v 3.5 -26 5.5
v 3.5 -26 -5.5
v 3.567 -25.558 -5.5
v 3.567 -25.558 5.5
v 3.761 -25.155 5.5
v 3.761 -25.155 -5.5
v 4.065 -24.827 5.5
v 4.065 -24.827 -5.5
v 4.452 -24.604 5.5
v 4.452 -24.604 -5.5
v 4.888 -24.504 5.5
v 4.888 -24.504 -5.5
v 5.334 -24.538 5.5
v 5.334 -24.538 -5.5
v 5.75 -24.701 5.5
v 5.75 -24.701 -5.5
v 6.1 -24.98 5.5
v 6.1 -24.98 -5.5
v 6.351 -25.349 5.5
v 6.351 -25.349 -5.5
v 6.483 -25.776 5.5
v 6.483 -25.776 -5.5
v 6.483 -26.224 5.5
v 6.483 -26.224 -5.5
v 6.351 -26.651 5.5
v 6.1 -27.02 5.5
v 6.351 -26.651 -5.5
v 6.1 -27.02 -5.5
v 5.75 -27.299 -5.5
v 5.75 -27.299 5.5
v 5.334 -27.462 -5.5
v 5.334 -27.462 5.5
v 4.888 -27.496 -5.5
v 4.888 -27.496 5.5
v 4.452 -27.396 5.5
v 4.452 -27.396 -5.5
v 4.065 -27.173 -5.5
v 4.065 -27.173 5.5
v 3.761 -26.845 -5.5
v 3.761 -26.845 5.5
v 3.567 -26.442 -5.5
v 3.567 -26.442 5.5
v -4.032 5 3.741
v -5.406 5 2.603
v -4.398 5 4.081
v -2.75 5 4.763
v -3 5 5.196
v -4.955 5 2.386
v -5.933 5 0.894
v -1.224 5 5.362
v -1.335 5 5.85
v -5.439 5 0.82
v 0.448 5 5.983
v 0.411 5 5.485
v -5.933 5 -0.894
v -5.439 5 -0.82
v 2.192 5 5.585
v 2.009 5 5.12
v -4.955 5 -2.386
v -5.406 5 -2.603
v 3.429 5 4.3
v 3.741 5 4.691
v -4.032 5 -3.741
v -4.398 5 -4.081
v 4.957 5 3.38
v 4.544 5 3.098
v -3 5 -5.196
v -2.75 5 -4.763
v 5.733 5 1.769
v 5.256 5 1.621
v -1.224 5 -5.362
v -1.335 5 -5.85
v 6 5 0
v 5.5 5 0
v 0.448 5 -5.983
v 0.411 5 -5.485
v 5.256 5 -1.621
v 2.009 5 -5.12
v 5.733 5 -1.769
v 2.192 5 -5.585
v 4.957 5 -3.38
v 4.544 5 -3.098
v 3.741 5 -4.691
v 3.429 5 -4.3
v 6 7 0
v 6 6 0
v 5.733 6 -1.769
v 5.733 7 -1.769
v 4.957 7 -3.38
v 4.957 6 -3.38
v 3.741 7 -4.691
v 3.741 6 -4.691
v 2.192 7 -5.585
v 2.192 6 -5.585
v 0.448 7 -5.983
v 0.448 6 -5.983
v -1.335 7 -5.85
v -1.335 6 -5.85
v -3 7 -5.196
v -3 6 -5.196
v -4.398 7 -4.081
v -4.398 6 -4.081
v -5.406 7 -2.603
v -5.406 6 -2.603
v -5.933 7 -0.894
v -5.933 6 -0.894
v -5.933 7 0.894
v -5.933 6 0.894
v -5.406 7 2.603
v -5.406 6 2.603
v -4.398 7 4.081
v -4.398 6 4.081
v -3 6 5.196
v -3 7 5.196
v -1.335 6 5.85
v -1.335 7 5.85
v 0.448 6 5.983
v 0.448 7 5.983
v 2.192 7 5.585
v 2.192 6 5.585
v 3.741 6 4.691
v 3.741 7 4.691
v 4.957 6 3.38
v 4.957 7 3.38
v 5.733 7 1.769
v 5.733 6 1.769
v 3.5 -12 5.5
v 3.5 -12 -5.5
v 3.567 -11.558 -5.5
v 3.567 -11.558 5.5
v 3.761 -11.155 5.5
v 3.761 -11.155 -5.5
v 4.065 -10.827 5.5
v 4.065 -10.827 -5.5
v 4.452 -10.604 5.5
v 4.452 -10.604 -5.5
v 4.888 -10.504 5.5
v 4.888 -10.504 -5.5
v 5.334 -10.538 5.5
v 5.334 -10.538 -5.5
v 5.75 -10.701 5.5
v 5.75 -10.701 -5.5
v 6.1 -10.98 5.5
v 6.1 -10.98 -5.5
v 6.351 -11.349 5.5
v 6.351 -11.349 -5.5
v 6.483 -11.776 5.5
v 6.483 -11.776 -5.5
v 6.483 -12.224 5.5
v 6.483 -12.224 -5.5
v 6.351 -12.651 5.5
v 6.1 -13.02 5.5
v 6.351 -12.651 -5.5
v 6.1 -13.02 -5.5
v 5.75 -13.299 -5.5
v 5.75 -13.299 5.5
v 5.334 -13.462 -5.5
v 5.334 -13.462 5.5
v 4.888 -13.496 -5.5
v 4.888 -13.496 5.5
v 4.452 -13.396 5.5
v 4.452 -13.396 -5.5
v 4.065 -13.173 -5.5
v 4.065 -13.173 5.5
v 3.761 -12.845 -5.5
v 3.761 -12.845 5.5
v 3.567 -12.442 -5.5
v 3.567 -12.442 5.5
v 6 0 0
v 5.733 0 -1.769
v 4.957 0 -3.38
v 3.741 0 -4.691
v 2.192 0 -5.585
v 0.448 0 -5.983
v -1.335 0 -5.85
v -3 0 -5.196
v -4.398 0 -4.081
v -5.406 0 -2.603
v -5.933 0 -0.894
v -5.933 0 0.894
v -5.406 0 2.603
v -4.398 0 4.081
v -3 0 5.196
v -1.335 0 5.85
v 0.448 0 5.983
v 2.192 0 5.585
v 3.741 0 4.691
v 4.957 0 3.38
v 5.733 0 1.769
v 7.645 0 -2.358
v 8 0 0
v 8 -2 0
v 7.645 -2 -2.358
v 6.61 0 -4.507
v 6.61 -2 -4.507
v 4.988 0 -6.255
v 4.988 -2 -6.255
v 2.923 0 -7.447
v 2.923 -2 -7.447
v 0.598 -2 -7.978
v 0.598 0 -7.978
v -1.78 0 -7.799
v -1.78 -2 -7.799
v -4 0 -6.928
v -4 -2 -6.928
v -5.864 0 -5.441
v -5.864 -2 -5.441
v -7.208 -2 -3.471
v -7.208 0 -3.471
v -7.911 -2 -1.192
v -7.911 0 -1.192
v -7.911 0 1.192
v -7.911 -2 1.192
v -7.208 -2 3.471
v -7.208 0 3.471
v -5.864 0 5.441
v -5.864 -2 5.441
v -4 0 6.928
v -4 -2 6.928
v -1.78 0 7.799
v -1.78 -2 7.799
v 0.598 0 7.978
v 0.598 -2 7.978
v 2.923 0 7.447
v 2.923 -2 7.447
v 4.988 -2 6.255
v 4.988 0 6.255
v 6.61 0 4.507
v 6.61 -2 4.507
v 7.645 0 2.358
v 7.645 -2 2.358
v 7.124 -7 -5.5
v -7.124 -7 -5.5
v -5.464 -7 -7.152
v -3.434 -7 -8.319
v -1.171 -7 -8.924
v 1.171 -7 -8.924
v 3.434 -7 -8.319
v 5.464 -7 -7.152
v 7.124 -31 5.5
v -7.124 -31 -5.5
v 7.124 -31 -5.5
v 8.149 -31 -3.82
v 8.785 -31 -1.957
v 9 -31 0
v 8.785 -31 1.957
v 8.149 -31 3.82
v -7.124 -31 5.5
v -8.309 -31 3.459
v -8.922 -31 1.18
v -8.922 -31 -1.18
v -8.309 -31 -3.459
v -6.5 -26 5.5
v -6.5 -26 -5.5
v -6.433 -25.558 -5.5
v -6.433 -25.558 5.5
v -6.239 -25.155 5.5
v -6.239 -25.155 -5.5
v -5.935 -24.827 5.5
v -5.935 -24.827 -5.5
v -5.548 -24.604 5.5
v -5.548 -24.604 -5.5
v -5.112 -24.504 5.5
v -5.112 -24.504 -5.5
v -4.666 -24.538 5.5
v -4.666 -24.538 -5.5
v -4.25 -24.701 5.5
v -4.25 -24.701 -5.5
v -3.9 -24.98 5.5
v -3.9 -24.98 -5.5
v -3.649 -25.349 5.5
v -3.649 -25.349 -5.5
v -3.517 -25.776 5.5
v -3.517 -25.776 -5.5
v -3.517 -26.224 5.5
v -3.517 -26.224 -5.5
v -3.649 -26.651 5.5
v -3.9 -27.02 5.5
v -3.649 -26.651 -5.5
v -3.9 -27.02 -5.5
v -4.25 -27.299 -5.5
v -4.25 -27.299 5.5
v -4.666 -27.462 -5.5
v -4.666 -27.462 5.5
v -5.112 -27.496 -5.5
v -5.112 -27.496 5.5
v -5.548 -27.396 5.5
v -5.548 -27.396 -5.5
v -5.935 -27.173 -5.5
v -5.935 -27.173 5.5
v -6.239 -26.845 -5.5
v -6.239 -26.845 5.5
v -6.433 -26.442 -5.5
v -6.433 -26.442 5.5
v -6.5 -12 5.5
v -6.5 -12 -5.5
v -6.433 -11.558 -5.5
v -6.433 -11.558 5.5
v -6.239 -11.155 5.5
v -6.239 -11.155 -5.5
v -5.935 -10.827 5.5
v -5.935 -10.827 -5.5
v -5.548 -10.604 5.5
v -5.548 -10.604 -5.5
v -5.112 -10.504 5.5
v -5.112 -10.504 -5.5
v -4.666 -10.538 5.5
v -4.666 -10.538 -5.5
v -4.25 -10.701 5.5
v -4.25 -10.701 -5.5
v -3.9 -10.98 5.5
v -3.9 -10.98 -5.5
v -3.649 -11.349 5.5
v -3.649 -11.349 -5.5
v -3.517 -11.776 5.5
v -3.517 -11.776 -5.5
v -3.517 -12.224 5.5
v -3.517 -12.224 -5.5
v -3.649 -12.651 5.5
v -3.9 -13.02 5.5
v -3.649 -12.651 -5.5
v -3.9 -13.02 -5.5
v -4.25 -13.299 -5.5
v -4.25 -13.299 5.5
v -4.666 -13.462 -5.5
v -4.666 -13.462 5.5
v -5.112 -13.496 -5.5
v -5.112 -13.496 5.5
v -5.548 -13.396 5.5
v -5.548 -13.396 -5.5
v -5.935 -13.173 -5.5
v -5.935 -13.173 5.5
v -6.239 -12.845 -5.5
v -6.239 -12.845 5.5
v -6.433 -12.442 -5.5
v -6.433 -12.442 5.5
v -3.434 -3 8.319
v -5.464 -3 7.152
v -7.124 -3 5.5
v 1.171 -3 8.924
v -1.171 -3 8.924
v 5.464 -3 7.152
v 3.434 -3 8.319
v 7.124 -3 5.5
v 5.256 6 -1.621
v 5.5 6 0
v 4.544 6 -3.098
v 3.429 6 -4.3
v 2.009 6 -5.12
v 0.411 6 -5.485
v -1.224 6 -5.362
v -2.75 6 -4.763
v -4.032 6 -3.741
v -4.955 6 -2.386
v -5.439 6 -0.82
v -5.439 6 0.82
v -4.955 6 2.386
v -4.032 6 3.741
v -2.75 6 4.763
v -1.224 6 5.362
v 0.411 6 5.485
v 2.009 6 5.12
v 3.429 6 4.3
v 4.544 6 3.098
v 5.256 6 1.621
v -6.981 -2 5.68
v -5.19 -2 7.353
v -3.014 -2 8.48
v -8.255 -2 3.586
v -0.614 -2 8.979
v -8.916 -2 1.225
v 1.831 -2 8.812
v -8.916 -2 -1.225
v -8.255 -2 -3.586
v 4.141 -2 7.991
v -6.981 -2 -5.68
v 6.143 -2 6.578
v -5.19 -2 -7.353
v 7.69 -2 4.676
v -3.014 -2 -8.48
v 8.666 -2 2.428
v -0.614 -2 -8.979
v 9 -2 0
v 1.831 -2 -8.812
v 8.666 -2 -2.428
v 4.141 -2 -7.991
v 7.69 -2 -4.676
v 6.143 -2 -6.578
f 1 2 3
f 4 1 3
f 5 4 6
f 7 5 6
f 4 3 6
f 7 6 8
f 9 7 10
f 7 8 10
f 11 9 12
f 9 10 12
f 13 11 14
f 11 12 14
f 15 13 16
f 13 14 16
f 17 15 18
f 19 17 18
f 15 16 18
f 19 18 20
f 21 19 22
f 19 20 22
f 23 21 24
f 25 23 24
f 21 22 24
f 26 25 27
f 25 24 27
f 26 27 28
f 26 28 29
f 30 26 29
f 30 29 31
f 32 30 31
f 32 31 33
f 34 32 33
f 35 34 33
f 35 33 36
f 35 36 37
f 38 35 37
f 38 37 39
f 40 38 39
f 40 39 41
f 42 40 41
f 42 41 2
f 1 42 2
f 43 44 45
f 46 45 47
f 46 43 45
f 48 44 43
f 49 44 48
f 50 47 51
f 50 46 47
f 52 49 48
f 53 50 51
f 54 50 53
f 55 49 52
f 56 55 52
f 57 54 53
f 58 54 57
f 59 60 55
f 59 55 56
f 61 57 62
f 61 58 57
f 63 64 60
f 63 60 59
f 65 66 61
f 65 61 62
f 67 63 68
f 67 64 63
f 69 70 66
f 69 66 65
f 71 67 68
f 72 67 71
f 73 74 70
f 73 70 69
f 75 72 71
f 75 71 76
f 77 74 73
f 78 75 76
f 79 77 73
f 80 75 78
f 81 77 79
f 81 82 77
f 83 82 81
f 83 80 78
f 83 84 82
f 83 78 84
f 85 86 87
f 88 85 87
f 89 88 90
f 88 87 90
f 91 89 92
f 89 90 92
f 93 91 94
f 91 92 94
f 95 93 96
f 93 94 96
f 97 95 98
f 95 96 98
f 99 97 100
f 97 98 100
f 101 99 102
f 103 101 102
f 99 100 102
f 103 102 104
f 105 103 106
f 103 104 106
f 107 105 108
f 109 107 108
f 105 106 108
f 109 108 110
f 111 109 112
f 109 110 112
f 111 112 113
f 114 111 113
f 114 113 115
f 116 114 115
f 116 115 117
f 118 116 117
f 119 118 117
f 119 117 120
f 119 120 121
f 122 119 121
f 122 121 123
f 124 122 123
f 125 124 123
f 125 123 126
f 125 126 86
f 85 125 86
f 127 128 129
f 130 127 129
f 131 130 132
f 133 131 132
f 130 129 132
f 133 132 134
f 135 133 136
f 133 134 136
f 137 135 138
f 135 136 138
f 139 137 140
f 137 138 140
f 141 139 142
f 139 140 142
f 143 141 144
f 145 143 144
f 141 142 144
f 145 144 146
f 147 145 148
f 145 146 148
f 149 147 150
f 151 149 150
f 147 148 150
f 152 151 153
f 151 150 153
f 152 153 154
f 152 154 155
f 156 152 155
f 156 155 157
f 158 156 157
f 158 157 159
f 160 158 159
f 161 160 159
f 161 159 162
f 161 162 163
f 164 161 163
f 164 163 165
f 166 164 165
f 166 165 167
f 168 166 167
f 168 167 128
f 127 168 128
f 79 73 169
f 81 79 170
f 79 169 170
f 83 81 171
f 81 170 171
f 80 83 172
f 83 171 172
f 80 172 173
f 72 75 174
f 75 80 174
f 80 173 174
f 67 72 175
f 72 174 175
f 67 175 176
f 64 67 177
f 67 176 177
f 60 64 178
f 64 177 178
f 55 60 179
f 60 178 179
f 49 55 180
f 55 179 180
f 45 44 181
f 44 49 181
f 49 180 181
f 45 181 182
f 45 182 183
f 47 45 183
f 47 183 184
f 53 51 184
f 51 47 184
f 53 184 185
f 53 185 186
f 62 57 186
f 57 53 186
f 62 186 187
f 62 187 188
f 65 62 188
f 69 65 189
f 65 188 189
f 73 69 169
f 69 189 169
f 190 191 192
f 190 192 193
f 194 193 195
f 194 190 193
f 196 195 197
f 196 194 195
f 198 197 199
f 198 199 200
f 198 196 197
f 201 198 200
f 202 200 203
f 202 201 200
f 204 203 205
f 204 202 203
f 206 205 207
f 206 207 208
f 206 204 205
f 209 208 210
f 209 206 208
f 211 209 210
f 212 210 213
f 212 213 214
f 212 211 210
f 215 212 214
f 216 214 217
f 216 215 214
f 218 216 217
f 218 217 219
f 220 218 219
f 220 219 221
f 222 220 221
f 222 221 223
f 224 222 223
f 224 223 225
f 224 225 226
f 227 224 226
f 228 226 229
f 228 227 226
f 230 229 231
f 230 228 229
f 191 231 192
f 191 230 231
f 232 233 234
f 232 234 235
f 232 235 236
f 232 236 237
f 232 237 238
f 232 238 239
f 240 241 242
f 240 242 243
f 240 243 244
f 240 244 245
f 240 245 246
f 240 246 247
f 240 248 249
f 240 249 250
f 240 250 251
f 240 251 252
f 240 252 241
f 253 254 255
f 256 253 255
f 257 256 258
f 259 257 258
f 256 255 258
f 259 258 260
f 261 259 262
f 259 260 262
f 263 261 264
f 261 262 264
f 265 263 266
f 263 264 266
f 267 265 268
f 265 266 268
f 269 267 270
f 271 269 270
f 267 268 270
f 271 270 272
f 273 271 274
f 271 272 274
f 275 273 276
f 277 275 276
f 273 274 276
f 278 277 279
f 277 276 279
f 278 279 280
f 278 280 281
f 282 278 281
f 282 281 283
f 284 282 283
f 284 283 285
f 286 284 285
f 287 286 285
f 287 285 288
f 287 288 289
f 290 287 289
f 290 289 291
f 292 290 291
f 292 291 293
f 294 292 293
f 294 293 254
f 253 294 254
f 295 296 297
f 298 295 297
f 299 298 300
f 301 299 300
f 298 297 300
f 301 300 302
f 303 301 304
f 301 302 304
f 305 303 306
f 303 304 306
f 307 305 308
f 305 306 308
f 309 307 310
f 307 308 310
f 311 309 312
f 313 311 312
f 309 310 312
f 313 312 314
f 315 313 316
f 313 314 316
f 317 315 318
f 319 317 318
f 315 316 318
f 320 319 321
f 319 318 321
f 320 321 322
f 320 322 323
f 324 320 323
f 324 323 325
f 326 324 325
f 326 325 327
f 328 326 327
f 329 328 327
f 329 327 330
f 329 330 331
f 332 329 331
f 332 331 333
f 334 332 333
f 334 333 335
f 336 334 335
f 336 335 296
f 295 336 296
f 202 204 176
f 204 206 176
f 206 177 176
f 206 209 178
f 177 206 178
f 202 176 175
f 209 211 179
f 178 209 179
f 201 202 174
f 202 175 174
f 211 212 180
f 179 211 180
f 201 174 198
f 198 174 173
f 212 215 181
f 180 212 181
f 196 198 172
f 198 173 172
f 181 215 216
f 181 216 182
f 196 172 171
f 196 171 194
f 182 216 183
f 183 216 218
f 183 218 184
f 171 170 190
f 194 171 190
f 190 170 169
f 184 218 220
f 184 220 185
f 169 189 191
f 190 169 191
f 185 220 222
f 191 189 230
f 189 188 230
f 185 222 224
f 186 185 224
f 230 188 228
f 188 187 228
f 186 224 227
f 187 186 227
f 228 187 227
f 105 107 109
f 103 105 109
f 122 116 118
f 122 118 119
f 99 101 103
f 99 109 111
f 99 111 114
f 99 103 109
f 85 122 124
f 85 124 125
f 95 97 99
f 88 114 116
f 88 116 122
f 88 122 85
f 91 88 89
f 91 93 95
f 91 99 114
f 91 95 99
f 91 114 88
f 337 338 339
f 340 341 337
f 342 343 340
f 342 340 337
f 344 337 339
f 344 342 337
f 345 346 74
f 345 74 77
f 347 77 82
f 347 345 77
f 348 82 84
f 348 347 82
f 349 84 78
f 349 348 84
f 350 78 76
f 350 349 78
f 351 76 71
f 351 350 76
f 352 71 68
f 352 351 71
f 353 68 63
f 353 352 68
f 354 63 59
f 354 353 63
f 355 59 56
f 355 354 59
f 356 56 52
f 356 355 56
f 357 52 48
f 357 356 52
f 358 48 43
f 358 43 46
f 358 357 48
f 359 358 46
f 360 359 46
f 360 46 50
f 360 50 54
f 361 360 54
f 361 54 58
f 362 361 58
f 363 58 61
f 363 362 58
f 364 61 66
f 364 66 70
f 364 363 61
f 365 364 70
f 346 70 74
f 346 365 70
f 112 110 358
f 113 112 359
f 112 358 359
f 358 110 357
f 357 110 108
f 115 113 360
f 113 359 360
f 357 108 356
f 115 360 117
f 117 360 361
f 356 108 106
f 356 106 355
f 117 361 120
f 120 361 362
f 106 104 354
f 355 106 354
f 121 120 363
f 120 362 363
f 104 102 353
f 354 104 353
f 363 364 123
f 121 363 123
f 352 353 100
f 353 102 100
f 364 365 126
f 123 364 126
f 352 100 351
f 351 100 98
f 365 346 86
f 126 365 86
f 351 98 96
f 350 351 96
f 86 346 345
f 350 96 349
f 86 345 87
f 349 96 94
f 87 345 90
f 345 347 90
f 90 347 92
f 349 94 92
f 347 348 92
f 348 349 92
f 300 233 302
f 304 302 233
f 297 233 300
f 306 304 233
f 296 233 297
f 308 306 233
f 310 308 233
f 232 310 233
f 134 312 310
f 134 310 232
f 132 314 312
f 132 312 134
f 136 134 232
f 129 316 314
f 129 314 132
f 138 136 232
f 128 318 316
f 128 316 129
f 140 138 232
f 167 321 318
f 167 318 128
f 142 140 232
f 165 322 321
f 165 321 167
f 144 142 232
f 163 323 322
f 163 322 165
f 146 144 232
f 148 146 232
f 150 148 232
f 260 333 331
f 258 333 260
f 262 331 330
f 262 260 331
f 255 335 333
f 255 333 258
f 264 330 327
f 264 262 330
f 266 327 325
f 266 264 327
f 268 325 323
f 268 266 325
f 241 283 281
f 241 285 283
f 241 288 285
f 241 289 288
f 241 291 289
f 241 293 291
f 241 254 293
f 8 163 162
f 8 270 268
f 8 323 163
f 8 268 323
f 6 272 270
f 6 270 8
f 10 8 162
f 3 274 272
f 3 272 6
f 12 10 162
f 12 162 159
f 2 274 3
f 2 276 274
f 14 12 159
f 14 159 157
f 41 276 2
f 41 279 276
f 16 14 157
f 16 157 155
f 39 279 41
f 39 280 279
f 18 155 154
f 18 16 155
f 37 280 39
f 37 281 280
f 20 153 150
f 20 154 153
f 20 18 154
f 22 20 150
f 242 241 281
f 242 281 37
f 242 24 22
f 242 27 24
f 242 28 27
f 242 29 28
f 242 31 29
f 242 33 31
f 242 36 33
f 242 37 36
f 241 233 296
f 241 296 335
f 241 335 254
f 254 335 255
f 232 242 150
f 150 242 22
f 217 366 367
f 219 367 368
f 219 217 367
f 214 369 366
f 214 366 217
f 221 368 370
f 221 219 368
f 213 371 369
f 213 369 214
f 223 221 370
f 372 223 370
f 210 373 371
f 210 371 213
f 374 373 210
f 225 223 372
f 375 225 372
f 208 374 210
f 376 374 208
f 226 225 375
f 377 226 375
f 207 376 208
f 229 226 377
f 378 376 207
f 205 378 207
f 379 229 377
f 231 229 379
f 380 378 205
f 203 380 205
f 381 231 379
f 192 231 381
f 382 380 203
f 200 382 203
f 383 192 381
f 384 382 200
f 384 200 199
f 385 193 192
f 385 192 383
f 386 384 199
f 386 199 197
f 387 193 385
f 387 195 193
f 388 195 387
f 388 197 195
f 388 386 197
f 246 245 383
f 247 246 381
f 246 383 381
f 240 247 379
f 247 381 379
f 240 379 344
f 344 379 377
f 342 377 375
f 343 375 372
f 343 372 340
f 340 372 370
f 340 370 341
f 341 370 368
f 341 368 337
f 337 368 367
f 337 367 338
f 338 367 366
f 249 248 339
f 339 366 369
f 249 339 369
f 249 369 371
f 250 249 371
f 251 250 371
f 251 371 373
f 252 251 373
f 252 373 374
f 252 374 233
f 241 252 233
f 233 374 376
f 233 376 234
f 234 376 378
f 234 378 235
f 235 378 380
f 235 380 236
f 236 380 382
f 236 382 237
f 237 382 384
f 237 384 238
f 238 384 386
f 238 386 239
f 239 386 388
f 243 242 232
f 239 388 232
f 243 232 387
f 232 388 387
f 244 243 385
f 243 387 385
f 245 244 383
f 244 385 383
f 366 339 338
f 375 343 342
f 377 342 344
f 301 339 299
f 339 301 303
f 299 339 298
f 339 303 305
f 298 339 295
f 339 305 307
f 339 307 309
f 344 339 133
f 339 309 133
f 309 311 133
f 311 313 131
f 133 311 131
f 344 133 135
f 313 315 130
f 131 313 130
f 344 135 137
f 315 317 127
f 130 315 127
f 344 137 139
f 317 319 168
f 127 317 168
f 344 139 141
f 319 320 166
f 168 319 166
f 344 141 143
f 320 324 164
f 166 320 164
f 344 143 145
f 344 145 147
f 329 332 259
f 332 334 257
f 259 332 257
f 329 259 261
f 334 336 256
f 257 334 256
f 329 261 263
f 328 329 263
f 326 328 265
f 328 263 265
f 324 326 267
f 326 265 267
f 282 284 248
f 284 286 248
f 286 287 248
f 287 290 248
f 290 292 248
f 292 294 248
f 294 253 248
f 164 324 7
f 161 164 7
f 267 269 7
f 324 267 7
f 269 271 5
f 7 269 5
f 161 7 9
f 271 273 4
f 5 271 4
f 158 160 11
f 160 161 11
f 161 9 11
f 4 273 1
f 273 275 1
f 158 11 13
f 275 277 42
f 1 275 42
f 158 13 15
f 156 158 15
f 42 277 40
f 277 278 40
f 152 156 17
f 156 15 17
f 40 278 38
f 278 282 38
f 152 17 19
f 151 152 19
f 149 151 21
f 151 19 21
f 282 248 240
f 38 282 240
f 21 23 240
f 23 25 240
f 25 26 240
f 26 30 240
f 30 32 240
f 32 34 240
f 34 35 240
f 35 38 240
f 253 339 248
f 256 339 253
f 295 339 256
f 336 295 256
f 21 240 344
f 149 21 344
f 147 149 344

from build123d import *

# Parameters (mm, degrees)
SKETCH_1_R          = 6
EXTRUDE_1_DEPTH     = 7
SKETCH_2_R          = 9
EXTRUDE_2_DEPTH     = 31
SKETCH_3_W          = 19.613357353
SKETCH_3_H          = 3.5
CUT_EXTRUDE_1_DEPTH = 24
SKETCH_4_W          = 20.018720859
SKETCH_4_H          = 3.5
CUT_EXTRUDE_2_DEPTH = 28
SKETCH_5_R          = 1.5
CUT_EXTRUDE_3_DEPTH = 18
SKETCH_11_R         = 10.638163441
SKETCH_11_R_2       = 5.5
CUT_EXTRUDE_4_DEPTH = 1
SKETCH_12_R         = 9
SKETCH_12_R_2       = 8
CUT_EXTRUDE_7_DEPTH = 2


with BuildPart() as part:
    # 草图1 → 凸台-拉伸1 (new body)
    with BuildSketch(Plane(origin=(0, 0, 0), x_dir=(1, 0, 0), z_dir=(0, 1, 0))):
        Circle(SKETCH_1_R)
    extrude(amount=EXTRUDE_1_DEPTH)

    # 草图2 → 凸台-拉伸2 (add)
    with BuildSketch(Plane.XZ):
        Circle(SKETCH_2_R)
    extrude(amount=EXTRUDE_2_DEPTH)

    # 草图3 → 切除-拉伸1 (cut)
    with BuildSketch(Plane.XZ.offset(31)):
        with Locations((1.075772383, -7.25)):
            Rectangle(SKETCH_3_W, SKETCH_3_H)
    extrude(amount=-CUT_EXTRUDE_1_DEPTH, mode=Mode.SUBTRACT)

    # 草图4 → 切除-拉伸2 (cut)
    with BuildSketch(Plane.XZ.offset(31)):
        with Locations((1.37199956, 7.25)):
            Rectangle(SKETCH_4_W, SKETCH_4_H)
    extrude(amount=-CUT_EXTRUDE_2_DEPTH, mode=Mode.SUBTRACT)

    # 草图5 → 切除-拉伸3 (cut)
    with BuildSketch(Plane(origin=(0, 0, -5.5), x_dir=(-1, 0, 0), z_dir=(0, 0, -1))):
        with Locations((-5, -26)):
            Circle(SKETCH_5_R)
        with Locations((5, -26)):
            Circle(SKETCH_5_R)
        with Locations((5, -12)):
            Circle(SKETCH_5_R)
        with Locations((-5, -12)):
            Circle(SKETCH_5_R)
    extrude(amount=-CUT_EXTRUDE_3_DEPTH, mode=Mode.SUBTRACT)

    # 草图11 → 切除-拉伸4 (cut)
    with BuildSketch(Plane(origin=(0, 6, 0), x_dir=(1, 0, 0), z_dir=(0, 1, 0))):
        Circle(SKETCH_11_R)
        Circle(SKETCH_11_R_2, mode=Mode.SUBTRACT)
    extrude(amount=-CUT_EXTRUDE_4_DEPTH, mode=Mode.SUBTRACT)

    # 草图12 → 切除-拉伸7 (cut)
    with BuildSketch(Plane(origin=(0, 0, 0), x_dir=(1, 0, 0), z_dir=(0, 1, 0))):
        Circle(SKETCH_12_R)
        Circle(SKETCH_12_R_2, mode=Mode.SUBTRACT)
    extrude(amount=-CUT_EXTRUDE_7_DEPTH, mode=Mode.SUBTRACT)


solid = part.part
